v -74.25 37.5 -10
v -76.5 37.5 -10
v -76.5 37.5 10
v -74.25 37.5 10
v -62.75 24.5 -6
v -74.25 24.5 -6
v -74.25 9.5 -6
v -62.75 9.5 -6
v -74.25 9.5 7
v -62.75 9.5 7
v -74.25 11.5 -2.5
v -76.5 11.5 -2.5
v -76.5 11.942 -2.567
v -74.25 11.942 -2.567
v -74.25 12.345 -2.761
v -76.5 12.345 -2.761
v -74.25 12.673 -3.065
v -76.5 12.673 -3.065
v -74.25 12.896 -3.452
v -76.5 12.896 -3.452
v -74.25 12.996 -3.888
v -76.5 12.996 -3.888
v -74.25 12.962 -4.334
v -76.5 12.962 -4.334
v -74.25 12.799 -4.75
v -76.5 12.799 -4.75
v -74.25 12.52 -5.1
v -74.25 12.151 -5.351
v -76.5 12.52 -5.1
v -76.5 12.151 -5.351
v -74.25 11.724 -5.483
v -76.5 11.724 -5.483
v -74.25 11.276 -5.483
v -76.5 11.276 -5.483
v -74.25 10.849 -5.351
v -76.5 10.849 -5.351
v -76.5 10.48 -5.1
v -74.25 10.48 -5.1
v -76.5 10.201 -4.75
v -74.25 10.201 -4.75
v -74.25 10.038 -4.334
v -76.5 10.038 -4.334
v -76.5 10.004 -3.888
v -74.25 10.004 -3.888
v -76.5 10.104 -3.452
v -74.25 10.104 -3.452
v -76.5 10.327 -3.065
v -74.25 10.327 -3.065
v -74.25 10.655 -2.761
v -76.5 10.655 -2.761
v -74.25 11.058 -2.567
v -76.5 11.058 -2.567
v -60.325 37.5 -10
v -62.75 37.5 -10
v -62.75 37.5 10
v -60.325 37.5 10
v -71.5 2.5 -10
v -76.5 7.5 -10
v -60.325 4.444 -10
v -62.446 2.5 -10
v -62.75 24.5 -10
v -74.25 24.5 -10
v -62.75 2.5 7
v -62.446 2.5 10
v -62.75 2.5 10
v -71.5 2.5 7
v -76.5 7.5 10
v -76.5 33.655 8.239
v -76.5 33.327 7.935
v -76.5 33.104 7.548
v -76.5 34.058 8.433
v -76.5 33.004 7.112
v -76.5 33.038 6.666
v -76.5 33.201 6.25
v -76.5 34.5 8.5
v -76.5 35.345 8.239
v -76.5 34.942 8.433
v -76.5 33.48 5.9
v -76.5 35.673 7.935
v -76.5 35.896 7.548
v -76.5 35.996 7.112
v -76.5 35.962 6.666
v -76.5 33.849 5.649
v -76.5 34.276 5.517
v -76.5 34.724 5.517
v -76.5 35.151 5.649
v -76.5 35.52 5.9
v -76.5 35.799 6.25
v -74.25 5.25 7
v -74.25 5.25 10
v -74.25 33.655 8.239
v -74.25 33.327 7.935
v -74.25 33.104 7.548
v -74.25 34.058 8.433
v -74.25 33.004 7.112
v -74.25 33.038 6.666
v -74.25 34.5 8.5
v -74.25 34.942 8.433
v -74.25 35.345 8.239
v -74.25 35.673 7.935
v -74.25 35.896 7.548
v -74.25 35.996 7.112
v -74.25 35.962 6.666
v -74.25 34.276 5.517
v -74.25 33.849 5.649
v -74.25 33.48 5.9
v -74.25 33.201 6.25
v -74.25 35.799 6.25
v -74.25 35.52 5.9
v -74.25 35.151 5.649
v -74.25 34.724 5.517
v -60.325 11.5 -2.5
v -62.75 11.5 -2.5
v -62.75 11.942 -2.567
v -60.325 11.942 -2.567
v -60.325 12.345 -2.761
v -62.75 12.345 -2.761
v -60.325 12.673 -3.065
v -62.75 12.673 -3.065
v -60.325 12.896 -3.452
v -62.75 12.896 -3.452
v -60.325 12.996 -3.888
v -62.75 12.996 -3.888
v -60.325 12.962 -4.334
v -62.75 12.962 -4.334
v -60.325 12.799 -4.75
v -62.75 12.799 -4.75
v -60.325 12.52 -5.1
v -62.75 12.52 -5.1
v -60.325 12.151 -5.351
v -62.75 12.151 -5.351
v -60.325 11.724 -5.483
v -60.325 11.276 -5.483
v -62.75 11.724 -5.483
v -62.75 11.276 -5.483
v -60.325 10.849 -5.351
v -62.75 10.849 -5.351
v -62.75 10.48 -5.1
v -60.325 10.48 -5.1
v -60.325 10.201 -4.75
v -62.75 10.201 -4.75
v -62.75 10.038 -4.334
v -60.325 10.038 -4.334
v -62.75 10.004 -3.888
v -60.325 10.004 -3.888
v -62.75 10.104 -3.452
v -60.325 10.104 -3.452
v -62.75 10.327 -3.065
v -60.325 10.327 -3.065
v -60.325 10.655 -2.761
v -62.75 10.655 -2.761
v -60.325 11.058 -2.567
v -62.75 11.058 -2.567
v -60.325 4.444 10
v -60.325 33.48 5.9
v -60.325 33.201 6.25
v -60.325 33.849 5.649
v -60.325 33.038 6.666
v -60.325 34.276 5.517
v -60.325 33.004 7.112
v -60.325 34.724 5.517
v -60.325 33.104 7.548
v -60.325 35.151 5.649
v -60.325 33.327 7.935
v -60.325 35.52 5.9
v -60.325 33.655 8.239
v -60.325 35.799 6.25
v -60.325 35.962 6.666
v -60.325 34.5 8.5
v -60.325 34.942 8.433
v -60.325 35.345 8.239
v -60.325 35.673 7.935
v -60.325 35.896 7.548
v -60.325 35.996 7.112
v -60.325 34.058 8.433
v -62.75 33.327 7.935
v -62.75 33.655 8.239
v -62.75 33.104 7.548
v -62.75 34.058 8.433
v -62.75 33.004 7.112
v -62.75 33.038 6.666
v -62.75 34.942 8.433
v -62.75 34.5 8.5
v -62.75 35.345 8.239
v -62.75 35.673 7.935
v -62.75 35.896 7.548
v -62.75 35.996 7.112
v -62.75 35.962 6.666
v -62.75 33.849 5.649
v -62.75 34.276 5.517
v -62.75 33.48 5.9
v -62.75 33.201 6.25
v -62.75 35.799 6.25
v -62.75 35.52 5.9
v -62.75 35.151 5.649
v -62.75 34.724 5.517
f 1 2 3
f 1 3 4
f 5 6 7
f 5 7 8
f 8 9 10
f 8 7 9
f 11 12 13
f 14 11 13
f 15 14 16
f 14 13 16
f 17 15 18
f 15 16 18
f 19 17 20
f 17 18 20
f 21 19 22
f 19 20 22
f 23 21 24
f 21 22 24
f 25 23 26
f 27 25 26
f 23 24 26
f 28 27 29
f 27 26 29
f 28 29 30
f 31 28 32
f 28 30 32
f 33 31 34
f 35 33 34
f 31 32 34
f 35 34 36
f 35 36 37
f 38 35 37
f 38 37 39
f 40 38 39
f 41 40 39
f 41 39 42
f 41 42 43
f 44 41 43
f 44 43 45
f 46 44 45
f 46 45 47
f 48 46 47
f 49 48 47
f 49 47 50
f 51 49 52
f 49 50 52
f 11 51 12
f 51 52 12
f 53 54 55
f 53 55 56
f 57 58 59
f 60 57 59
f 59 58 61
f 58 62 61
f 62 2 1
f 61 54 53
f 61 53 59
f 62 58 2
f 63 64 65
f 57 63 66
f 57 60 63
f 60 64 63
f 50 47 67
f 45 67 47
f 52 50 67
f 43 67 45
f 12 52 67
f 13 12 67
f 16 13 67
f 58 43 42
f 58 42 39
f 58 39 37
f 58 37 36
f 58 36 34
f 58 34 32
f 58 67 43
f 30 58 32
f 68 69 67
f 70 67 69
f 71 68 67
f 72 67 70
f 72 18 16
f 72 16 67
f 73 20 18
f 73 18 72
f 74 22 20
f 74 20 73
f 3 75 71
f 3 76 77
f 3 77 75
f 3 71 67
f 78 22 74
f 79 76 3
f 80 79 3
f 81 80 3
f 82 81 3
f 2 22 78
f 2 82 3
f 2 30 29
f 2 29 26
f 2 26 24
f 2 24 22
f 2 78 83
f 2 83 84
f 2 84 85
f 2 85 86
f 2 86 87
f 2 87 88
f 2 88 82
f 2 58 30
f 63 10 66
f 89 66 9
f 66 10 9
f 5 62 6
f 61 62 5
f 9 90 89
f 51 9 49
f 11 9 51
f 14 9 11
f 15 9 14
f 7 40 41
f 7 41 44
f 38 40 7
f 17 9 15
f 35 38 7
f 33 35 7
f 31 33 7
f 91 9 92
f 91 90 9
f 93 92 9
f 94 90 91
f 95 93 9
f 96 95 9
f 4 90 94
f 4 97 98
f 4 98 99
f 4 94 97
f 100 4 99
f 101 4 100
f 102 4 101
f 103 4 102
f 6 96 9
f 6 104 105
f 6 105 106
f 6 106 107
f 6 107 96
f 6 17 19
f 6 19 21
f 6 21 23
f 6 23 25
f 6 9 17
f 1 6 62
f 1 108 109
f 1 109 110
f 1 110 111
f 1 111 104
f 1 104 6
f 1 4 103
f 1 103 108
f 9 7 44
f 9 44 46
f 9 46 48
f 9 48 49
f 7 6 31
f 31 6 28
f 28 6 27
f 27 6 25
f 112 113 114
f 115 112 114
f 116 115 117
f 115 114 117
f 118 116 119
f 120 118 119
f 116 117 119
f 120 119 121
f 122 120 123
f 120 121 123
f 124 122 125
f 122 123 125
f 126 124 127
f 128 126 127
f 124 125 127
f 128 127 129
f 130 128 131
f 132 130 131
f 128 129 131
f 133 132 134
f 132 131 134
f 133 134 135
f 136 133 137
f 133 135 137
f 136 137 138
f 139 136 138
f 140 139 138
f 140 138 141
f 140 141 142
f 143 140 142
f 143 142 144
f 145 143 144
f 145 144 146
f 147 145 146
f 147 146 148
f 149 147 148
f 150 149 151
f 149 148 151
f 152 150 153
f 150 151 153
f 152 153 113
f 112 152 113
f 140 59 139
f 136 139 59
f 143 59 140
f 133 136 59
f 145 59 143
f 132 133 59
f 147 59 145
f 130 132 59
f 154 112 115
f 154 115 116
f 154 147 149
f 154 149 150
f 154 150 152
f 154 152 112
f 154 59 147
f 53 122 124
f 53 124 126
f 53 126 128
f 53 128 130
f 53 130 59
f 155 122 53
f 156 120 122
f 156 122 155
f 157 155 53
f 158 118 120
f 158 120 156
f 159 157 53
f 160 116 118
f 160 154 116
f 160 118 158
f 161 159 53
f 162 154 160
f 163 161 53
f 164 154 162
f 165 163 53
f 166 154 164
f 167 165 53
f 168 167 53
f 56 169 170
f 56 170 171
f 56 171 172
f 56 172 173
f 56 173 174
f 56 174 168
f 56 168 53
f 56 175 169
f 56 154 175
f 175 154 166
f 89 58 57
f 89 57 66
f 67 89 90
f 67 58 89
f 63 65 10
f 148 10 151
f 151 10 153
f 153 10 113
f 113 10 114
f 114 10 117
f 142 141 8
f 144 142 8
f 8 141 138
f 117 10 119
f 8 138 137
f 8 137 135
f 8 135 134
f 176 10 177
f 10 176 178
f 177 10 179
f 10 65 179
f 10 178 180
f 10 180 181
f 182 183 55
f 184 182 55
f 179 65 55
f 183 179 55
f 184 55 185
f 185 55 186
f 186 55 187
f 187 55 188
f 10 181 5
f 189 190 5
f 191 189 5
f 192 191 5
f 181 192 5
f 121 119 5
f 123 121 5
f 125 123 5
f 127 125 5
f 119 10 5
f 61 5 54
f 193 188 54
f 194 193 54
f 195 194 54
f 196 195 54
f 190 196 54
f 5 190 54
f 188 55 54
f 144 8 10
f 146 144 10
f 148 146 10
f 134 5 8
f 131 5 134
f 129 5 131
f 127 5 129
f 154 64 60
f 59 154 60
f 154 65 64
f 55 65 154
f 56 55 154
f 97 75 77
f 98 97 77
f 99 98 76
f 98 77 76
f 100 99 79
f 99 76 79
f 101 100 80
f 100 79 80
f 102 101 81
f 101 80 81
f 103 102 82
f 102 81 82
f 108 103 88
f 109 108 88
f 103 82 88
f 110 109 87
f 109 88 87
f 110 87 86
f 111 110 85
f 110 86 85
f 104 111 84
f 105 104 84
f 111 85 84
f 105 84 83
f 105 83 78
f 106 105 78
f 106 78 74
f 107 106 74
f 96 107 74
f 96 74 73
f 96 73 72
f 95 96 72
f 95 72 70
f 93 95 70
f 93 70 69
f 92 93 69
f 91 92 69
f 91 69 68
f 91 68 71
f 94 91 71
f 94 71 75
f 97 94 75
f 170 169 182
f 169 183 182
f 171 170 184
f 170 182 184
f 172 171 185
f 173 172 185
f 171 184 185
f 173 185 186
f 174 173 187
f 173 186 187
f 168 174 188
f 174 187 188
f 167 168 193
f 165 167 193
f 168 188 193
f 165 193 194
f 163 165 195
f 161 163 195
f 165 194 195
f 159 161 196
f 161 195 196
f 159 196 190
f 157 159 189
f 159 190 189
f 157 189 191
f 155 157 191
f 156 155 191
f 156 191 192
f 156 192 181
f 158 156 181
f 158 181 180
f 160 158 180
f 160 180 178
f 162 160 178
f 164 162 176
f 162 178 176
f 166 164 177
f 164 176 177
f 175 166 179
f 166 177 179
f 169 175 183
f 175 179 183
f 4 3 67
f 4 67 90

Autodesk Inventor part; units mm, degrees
ref_plane "YZ Plane" through (0, 0, 0) normal (1, 0, 0) x (0, 1, 0)
ref_plane "XZ Plane" through (0, 0, 0) normal (0, 1, 0) x (-1, 0, 0)
ref_plane "XY Plane" through (0, 0, 0) normal (0, 0, 1) x (1, 0, 0)
sketch "Sketch1" plane through (0, 0, 0) normal (0, 0, 1) x (1, 0, 0)
  circle A0 centre (0, 0) radius 57.5
  line L0 (0, 0) -> (0, 22.225)
  circle A1 centre (0, 0) radius 60.5
  line L1 (60.5, 0) -> (60.5, 20)
  line L2 (60.5, 0) -> (80.5, 0) construction
  line L3 (-60.5, 0) -> (-60.5, 20)
  line L4 (-60.5, 0) -> (-40.5, 0) construction
  line L5 (-76.5, 37.5) -> (-44.5, 37.5)
  line L6 (-44.5, 37.5) -> (-44.5, 2.5)
  line L7 (-44.5, 2.5) -> (-76.5, 2.5)
  line L8 (-76.5, 2.5) -> (-76.5, 37.5)
  line L9 (-76.5, 37.5) -> (-44.5, 2.5) construction
  line L10 (-44.5, 37.5) -> (-76.5, 2.5) construction
  line L11 (44.5, 37.5) -> (76.5, 37.5)
  line L12 (76.5, 37.5) -> (76.5, 2.5)
  line L13 (76.5, 2.5) -> (44.5, 2.5)
  line L14 (44.5, 2.5) -> (44.5, 37.5)
  line L15 (44.5, 37.5) -> (76.5, 2.5) construction
  line L16 (76.5, 37.5) -> (44.5, 2.5) construction
  point P0 (-57.4456, 2.5)
  point P1 (57.4456, 2.5)
  point P2 (47.4763, 37.5)
  point P3 (-47.4763, 37.5)
  dimension "d0" = 115
  dimension "d27" = 121
  dimension "d28" = 20
  dimension "d29" = 90
  dimension "d30" = 20
  dimension "d31" = 90
  dimension "d32" = 32
  dimension "d33" = 35
  dimension "d34" = 32
  dimension "d35" = 35
extrude "Extrusion1" add sketch "Sketch1" along normal mid plane 20 contours A0 L14 L11 A1 L13 | L7 A1 L5 L6 A0 | A0 L6 L5 A1 L11 L14 | A1 L11 L12 L13 | L7 L8 L5 A1
sketch "Sketch5" plane through (-76.5, 37.5, 10) normal (0, 1, 0) x (1, 0, 0)
  line L0 (0, 0) -> (0, 20) projected
  line L1 (0, 10) -> (3, 10)
  line L2 (3, 10) -> (8, 10)
  line L3 (13.75, -5) -> (2.25, -5)
  line L4 (2.25, -5) -> (2.25, 25)
  line L5 (2.25, 25) -> (13.75, 25)
  line L6 (13.75, 25) -> (13.75, -5)
  line L7 (13.75, -5) -> (2.25, 25) construction
  line L8 (2.25, -5) -> (13.75, 25) construction
  point P0 (76.5, 10)
  dimension "d36" = 3
  dimension "d37" = 5
  dimension "d38" = 11.5
  dimension "d39" = 30
extrude "Extrusion5" cut sketch "Sketch5" against normal blind 13
sketch "Sketch6" plane through (-76.5, 24.5, 10) normal (0, 1, 0) x (1, 0, 0)
  line L0 (13.75, 0) -> (2.25, 0) projected
  line L1 (13.75, 20) -> (13.75, 0) projected
  line L2 (2.25, 20) -> (13.75, 20) projected
  line L3 (2.25, 0) -> (2.25, 20) projected
  line L4 (8, 0) -> (8, 8)
  line L5 (13.75, 0) -> (2.25, 0)
  line L6 (2.25, 0) -> (2.25, 16)
  line L7 (2.25, 16) -> (13.75, 16)
  line L8 (13.75, 16) -> (13.75, 0)
  line L9 (13.75, 0) -> (2.25, 16) construction
  line L10 (2.25, 0) -> (13.75, 16) construction
  point P0 (76.5, 10)
  point P1 (13.75, 16)
  point P2 (2.25, 16)
  dimension "d42" = 8
  dimension "d43" = 11.5
  dimension "d44" = 16
extrude "Extrusion6" cut sketch "Sketch6" against normal blind 15 contours L0 L3 L7 L1
sketch "Sketch7" plane through (-76.5, 2.5, 10) normal (-1, 0, 0) x (0, 0, 1)
  line L0 (0, 35) -> (0, 0) projected
  line L1 (-16, 7) -> (0, 7) projected
  line L2 (0, 35) -> (-16, 35)
  line L3 (-16, 35) -> (-16, 7)
  line L4 (-16, 7) -> (0, 7)
  line L5 (0, 7) -> (0, 35)
  line L6 (-16, 7) -> (-14, 7)
  line L7 (-14, 7) -> (-14, 9)
  line L8 (0, 35) -> (-3, 35)
  line L9 (0, 35) -> (-20, 35) projected
  line L10 (0, 35) -> (3, 35) construction
  line L11 (-3, 35) -> (-3, 32)
  circle A0 centre (-3, 32) radius 1.5
  circle A1 centre (-14, 9) radius 1.5
  point P0 (-10, -2.5)
  dimension "d47" = 16
  dimension "d48" = 28
  dimension "d49" = 2
  dimension "d50" = 2
  dimension "d51" = 90
  dimension "d52" = 3
  dimension "d53" = 180
  dimension "d54" = 3
  dimension "d55" = 3
  dimension "d56" = 3
extrude "Extrusion7" cut sketch "Sketch7" against normal blind 20 contours A0 | A1
mirror "Mirror2" about plane through (0, 0, 0) normal (1, 0, 0) of "Extrusion5", "Extrusion6", "Extrusion7"
chamfer "Chamfer1" distance 5 angle 45 2 edges at (-76.5, 2.5, 0) (76.5, 2.5, 0)
fillet "Fillet1" radius 7 2 edges at (-47.4763, 37.5, 0) (47.4763, 37.5, 0)
chamfer "Chamfer2" distance 5 angle 45 2 edges at (-57.4456, 2.5, 0) (57.4456, 2.5, 0)
sketch "Sketch8" plane through (-76.5, 9.5, 10) normal (0, 1, 0) x (1, 0, 0)
  line L0 (13.75, 0) -> (2.25, 0) projected
  line L1 (8, 0) -> (8, 3)
  line L2 (13.75, 6) -> (2.25, 6)
  line L3 (2.25, 6) -> (2.25, 0)
  line L4 (2.25, 0) -> (13.75, 0)
  line L5 (13.75, 0) -> (13.75, 6)
  line L6 (13.75, 6) -> (2.25, 0) construction
  line L7 (2.25, 6) -> (13.75, 0) construction
  line L8 (13.75, 3) -> (2.25, 3)
  point P0 (76.5, 10)
  point P1 (13.75, 0)
  dimension "d66" = 3
  dimension "d67" = 11.5
  dimension "d68" = 6
extrude "Extrusion8" cut sketch "Sketch8" against normal blind 20 contours L0 L1 L8 L5 | L0 L3 L8 L1
mirror "Mirror3" about plane through (0, 0, 0) normal (1, 0, 0) of "Extrusion8"
sketch "Sketch9" plane through (0, 0, 10) normal (0, 0, 1) x (1, 0, 0)
  line L0 (-60.325, 74.6125) -> (82.55, 74.6125)
  line L1 (82.55, 74.6125) -> (82.55, -23.8125)
  line L2 (82.55, -23.8125) -> (-60.325, -23.8125)
  line L3 (-60.325, -23.8125) -> (-60.325, 74.6125)
  point P0 (0, 0)
extrude "Extrusion9" cut sketch "Sketch9" against normal blind 30
properties part number "IMPRIMIR SOPORTE"
